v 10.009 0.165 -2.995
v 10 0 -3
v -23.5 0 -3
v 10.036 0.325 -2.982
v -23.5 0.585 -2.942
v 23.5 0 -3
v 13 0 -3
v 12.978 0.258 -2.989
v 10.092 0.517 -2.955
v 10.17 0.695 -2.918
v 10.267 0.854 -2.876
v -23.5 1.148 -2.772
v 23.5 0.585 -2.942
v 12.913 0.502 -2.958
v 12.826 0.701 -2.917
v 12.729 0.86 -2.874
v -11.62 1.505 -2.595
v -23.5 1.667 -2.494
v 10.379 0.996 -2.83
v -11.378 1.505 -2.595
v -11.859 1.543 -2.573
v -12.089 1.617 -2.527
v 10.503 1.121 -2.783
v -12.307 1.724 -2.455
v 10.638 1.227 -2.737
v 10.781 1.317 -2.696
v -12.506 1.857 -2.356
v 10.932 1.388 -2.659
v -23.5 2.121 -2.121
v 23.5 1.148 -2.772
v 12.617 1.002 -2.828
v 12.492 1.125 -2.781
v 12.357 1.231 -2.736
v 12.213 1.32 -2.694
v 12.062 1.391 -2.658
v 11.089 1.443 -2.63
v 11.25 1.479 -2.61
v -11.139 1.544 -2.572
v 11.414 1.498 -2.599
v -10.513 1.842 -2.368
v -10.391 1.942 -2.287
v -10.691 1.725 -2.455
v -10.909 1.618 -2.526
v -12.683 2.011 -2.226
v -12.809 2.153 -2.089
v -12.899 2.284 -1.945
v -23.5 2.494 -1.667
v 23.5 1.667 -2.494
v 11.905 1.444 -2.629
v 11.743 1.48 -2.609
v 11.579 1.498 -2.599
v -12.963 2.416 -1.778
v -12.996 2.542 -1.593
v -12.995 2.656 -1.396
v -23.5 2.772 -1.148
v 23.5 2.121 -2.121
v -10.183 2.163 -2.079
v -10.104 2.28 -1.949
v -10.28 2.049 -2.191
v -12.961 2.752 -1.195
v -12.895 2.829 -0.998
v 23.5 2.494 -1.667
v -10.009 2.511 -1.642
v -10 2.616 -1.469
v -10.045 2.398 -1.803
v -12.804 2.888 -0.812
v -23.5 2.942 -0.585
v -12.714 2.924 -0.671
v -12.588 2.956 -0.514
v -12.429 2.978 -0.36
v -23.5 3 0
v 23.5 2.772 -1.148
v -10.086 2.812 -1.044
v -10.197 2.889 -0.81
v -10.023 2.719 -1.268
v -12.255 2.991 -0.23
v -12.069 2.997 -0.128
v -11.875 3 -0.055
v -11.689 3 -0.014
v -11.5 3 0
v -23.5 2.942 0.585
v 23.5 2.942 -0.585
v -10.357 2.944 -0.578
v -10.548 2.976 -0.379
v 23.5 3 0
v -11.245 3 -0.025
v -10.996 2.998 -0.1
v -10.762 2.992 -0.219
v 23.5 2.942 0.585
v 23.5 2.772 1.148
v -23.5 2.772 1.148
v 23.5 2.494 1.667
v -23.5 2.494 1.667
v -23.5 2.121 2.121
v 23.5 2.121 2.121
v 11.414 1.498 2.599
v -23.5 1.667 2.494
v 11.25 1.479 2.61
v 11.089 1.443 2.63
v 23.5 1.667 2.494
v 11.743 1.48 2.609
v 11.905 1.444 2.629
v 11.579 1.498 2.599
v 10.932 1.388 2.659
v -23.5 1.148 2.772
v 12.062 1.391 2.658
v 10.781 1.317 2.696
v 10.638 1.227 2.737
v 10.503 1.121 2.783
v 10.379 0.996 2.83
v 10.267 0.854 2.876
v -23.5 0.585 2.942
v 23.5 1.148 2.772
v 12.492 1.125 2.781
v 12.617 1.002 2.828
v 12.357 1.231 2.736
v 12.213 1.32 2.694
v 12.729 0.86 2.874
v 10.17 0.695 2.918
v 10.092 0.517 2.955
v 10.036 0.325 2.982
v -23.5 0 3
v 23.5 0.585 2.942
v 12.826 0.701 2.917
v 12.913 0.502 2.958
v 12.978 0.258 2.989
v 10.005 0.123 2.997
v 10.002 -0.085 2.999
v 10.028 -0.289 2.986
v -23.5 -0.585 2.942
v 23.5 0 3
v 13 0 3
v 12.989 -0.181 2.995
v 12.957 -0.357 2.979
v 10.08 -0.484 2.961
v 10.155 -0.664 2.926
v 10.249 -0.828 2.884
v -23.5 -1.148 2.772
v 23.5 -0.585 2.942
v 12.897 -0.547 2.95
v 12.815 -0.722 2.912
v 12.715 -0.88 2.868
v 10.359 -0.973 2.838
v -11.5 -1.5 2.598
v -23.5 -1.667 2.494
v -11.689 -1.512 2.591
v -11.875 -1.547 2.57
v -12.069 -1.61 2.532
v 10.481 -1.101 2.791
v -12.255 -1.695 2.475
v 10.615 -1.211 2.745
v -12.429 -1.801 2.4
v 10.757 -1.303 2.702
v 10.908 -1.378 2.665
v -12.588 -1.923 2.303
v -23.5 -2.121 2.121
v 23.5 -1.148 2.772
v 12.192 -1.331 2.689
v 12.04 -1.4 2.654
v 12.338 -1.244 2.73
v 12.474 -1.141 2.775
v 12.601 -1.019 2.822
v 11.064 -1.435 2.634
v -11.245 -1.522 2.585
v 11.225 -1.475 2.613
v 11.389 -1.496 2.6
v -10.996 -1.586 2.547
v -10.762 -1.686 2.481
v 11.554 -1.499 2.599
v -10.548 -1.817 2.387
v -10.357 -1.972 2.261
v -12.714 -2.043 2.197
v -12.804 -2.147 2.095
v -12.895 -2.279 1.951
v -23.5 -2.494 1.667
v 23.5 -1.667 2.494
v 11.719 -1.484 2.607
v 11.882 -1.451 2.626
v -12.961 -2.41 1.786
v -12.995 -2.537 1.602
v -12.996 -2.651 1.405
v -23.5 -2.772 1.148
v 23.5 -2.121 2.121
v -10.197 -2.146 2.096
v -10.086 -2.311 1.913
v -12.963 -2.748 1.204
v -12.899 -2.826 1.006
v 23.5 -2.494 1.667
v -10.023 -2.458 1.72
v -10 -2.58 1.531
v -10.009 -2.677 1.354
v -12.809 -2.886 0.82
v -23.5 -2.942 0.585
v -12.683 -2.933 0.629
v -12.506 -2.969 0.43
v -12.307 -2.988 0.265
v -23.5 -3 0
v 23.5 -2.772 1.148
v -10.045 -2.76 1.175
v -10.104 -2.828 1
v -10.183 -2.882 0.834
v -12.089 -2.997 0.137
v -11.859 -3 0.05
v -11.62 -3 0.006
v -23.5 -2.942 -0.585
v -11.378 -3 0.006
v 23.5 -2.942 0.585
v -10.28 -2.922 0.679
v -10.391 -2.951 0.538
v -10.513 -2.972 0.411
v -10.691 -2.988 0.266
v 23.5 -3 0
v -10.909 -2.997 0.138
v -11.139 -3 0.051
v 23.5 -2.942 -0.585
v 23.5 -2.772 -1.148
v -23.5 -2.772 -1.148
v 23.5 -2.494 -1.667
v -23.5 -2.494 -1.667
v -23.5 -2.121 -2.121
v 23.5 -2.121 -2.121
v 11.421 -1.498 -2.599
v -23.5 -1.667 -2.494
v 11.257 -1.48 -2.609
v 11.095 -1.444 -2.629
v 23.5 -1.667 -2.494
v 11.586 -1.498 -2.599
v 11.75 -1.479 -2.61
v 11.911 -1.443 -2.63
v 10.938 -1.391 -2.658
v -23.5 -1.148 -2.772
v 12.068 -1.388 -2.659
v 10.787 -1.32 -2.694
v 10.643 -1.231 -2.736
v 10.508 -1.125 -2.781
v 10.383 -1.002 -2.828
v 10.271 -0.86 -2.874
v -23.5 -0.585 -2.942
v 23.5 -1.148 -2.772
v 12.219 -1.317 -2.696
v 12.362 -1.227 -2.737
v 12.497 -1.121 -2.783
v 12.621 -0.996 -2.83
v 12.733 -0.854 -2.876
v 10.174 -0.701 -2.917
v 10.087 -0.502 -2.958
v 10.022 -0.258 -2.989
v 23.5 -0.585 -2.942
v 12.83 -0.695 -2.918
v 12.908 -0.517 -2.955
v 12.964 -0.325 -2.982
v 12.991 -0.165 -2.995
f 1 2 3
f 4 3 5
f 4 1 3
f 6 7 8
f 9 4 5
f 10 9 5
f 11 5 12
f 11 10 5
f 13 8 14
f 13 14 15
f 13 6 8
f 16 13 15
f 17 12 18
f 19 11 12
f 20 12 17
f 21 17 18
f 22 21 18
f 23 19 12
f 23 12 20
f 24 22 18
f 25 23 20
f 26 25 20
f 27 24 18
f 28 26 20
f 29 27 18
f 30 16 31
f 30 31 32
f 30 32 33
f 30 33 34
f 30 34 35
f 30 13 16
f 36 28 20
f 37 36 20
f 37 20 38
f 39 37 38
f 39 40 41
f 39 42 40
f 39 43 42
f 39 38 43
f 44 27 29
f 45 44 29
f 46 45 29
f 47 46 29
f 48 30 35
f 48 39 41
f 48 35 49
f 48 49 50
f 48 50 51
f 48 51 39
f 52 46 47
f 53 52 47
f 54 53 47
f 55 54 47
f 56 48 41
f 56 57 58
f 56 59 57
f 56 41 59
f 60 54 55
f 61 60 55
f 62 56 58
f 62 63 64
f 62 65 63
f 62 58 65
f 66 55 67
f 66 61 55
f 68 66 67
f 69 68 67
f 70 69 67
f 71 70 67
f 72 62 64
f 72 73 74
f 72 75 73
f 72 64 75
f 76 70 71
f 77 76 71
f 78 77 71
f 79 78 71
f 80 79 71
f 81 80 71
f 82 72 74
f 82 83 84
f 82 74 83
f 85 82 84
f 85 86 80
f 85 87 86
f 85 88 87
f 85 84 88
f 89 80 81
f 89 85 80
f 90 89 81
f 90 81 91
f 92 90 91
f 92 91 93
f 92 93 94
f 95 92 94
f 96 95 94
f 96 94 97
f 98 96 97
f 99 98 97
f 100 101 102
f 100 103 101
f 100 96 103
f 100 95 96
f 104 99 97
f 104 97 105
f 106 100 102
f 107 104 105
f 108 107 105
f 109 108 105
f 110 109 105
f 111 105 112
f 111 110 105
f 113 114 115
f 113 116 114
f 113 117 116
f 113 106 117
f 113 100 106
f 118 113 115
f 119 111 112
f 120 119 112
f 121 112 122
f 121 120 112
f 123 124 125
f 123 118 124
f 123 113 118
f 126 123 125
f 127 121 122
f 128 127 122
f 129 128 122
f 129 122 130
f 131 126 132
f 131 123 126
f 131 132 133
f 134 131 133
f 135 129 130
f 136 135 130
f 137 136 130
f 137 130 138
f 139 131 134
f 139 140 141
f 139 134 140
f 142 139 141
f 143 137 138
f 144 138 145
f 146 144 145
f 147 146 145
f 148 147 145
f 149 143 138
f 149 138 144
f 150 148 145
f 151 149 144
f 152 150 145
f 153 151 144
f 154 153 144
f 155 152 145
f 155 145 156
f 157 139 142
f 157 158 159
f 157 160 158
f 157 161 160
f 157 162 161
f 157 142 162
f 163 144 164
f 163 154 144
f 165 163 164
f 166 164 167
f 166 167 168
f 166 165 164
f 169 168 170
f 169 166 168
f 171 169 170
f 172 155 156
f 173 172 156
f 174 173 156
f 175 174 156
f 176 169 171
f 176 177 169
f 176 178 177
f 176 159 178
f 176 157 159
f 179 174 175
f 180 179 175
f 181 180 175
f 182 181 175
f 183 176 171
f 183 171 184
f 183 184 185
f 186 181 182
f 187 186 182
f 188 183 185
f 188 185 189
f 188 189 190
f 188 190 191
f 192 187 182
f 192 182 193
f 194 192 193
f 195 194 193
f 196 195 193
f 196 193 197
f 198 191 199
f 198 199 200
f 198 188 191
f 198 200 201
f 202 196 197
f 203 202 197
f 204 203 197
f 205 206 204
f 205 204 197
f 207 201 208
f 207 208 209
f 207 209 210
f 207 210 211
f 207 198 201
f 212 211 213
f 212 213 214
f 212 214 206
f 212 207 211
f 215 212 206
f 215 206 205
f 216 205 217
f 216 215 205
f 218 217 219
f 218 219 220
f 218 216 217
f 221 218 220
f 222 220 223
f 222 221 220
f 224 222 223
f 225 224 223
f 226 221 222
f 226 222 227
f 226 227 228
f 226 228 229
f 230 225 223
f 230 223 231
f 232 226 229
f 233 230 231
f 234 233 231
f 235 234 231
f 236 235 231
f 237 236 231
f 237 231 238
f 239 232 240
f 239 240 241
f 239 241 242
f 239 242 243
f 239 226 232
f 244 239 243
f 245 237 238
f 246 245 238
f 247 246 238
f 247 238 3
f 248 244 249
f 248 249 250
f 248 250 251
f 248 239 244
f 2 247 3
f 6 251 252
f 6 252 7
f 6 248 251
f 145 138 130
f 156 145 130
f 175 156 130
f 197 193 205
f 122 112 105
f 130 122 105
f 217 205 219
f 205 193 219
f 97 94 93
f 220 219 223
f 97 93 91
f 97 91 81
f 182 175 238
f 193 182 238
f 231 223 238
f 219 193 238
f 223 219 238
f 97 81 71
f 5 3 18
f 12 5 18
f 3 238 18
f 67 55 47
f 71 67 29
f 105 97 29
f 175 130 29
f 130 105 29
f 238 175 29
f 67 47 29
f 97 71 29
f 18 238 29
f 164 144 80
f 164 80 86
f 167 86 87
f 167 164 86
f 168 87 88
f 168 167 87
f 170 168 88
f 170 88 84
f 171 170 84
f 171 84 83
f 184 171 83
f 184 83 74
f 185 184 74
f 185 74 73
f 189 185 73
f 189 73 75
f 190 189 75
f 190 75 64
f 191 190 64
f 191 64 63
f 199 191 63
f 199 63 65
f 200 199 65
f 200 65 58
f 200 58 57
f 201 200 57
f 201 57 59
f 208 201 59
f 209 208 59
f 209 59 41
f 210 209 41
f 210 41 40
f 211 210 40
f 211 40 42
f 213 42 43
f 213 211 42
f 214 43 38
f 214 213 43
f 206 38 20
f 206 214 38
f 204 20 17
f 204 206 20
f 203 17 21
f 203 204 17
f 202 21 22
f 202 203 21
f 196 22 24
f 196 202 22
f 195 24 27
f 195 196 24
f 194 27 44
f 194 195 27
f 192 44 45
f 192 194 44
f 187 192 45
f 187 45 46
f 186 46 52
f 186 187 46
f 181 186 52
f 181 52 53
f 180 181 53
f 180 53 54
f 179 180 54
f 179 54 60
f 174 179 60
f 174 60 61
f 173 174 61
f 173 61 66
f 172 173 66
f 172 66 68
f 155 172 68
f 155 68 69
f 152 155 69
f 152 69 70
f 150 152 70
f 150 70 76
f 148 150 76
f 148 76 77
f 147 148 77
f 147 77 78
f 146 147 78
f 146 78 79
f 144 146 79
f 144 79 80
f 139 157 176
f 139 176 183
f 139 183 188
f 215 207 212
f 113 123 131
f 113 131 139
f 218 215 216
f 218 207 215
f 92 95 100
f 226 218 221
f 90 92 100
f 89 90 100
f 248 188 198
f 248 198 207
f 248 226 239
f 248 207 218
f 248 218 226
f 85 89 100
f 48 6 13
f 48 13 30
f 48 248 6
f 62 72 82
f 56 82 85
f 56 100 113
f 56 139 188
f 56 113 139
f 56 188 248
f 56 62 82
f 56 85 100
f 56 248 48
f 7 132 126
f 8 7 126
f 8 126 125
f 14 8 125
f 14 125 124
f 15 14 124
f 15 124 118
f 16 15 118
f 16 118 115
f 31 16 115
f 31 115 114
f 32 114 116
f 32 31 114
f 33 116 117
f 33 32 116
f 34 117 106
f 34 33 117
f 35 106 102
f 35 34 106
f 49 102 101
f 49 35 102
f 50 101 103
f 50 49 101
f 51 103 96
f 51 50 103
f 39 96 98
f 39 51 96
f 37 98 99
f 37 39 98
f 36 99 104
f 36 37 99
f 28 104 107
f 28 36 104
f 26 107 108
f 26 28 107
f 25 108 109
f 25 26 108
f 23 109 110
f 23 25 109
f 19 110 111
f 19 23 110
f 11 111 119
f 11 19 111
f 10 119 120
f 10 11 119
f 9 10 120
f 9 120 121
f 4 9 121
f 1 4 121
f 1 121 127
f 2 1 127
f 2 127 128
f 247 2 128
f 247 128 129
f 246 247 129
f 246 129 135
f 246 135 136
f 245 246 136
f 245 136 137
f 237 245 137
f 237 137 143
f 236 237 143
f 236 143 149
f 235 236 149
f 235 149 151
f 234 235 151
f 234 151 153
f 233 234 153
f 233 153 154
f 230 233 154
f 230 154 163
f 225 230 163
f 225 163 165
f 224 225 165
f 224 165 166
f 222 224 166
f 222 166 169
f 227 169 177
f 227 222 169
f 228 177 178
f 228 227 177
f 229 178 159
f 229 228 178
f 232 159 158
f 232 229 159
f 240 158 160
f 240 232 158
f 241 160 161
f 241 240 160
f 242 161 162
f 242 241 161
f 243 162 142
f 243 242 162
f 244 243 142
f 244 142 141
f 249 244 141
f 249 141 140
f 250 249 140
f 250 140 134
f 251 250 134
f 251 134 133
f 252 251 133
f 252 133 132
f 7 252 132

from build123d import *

# Parameters (mm, degrees)
SKETCH1_R               = 3
BOSS_EXTRUDE1_DEPTH     = 23.5
CUT_EXTRUDE1_DEPTH      = 24.879907873
CUT_EXTRUDE1_DEPTH_BACK = 24.879907873
SKETCH2_R               = 1.5
CUT_EXTRUDE2_DEPTH      = 24.879907996
CUT_EXTRUDE2_DEPTH_BACK = 24.879907996
SKETCH3_R               = 1.5


with BuildPart() as part:
    # Sketch1 → Boss-Extrude1 (new, symmetric)
    with BuildSketch(Plane.YZ):
        with Locations(Location((0, 0, 0), (0, 0, 270))):
            Circle(SKETCH1_R)
    extrude(amount=BOSS_EXTRUDE1_DEPTH, both=True)

    # Sketch2 → Cut-Extrude1 (cut, two sides: drawn at the far end of the back side and taken through both)
    with BuildSketch(Plane(origin=(0, 0, 0), x_dir=(0, 1, 0), z_dir=(0, 0, 1)).offset(-CUT_EXTRUDE1_DEPTH_BACK)):
        with Locations(Location((0, -11.5, 0), (0, 0, 270))):
            Circle(SKETCH2_R)
    extrude(amount=CUT_EXTRUDE1_DEPTH + CUT_EXTRUDE1_DEPTH_BACK, mode=Mode.SUBTRACT)

    # Sketch3 → Cut-Extrude2 (cut, two sides: drawn at the far end of the back side and taken through both)
    with BuildSketch(Plane(origin=(0, 0, 0), x_dir=(-1, 0, 0), z_dir=(0, 0.8660254037844364, -0.5000000000000041)).offset(-CUT_EXTRUDE2_DEPTH_BACK)):
        with Locations(Location((11.5, 0, 0), (0, 0, 90))):
            Circle(SKETCH3_R)
    extrude(amount=CUT_EXTRUDE2_DEPTH + CUT_EXTRUDE2_DEPTH_BACK, mode=Mode.SUBTRACT)


solid = part.part
